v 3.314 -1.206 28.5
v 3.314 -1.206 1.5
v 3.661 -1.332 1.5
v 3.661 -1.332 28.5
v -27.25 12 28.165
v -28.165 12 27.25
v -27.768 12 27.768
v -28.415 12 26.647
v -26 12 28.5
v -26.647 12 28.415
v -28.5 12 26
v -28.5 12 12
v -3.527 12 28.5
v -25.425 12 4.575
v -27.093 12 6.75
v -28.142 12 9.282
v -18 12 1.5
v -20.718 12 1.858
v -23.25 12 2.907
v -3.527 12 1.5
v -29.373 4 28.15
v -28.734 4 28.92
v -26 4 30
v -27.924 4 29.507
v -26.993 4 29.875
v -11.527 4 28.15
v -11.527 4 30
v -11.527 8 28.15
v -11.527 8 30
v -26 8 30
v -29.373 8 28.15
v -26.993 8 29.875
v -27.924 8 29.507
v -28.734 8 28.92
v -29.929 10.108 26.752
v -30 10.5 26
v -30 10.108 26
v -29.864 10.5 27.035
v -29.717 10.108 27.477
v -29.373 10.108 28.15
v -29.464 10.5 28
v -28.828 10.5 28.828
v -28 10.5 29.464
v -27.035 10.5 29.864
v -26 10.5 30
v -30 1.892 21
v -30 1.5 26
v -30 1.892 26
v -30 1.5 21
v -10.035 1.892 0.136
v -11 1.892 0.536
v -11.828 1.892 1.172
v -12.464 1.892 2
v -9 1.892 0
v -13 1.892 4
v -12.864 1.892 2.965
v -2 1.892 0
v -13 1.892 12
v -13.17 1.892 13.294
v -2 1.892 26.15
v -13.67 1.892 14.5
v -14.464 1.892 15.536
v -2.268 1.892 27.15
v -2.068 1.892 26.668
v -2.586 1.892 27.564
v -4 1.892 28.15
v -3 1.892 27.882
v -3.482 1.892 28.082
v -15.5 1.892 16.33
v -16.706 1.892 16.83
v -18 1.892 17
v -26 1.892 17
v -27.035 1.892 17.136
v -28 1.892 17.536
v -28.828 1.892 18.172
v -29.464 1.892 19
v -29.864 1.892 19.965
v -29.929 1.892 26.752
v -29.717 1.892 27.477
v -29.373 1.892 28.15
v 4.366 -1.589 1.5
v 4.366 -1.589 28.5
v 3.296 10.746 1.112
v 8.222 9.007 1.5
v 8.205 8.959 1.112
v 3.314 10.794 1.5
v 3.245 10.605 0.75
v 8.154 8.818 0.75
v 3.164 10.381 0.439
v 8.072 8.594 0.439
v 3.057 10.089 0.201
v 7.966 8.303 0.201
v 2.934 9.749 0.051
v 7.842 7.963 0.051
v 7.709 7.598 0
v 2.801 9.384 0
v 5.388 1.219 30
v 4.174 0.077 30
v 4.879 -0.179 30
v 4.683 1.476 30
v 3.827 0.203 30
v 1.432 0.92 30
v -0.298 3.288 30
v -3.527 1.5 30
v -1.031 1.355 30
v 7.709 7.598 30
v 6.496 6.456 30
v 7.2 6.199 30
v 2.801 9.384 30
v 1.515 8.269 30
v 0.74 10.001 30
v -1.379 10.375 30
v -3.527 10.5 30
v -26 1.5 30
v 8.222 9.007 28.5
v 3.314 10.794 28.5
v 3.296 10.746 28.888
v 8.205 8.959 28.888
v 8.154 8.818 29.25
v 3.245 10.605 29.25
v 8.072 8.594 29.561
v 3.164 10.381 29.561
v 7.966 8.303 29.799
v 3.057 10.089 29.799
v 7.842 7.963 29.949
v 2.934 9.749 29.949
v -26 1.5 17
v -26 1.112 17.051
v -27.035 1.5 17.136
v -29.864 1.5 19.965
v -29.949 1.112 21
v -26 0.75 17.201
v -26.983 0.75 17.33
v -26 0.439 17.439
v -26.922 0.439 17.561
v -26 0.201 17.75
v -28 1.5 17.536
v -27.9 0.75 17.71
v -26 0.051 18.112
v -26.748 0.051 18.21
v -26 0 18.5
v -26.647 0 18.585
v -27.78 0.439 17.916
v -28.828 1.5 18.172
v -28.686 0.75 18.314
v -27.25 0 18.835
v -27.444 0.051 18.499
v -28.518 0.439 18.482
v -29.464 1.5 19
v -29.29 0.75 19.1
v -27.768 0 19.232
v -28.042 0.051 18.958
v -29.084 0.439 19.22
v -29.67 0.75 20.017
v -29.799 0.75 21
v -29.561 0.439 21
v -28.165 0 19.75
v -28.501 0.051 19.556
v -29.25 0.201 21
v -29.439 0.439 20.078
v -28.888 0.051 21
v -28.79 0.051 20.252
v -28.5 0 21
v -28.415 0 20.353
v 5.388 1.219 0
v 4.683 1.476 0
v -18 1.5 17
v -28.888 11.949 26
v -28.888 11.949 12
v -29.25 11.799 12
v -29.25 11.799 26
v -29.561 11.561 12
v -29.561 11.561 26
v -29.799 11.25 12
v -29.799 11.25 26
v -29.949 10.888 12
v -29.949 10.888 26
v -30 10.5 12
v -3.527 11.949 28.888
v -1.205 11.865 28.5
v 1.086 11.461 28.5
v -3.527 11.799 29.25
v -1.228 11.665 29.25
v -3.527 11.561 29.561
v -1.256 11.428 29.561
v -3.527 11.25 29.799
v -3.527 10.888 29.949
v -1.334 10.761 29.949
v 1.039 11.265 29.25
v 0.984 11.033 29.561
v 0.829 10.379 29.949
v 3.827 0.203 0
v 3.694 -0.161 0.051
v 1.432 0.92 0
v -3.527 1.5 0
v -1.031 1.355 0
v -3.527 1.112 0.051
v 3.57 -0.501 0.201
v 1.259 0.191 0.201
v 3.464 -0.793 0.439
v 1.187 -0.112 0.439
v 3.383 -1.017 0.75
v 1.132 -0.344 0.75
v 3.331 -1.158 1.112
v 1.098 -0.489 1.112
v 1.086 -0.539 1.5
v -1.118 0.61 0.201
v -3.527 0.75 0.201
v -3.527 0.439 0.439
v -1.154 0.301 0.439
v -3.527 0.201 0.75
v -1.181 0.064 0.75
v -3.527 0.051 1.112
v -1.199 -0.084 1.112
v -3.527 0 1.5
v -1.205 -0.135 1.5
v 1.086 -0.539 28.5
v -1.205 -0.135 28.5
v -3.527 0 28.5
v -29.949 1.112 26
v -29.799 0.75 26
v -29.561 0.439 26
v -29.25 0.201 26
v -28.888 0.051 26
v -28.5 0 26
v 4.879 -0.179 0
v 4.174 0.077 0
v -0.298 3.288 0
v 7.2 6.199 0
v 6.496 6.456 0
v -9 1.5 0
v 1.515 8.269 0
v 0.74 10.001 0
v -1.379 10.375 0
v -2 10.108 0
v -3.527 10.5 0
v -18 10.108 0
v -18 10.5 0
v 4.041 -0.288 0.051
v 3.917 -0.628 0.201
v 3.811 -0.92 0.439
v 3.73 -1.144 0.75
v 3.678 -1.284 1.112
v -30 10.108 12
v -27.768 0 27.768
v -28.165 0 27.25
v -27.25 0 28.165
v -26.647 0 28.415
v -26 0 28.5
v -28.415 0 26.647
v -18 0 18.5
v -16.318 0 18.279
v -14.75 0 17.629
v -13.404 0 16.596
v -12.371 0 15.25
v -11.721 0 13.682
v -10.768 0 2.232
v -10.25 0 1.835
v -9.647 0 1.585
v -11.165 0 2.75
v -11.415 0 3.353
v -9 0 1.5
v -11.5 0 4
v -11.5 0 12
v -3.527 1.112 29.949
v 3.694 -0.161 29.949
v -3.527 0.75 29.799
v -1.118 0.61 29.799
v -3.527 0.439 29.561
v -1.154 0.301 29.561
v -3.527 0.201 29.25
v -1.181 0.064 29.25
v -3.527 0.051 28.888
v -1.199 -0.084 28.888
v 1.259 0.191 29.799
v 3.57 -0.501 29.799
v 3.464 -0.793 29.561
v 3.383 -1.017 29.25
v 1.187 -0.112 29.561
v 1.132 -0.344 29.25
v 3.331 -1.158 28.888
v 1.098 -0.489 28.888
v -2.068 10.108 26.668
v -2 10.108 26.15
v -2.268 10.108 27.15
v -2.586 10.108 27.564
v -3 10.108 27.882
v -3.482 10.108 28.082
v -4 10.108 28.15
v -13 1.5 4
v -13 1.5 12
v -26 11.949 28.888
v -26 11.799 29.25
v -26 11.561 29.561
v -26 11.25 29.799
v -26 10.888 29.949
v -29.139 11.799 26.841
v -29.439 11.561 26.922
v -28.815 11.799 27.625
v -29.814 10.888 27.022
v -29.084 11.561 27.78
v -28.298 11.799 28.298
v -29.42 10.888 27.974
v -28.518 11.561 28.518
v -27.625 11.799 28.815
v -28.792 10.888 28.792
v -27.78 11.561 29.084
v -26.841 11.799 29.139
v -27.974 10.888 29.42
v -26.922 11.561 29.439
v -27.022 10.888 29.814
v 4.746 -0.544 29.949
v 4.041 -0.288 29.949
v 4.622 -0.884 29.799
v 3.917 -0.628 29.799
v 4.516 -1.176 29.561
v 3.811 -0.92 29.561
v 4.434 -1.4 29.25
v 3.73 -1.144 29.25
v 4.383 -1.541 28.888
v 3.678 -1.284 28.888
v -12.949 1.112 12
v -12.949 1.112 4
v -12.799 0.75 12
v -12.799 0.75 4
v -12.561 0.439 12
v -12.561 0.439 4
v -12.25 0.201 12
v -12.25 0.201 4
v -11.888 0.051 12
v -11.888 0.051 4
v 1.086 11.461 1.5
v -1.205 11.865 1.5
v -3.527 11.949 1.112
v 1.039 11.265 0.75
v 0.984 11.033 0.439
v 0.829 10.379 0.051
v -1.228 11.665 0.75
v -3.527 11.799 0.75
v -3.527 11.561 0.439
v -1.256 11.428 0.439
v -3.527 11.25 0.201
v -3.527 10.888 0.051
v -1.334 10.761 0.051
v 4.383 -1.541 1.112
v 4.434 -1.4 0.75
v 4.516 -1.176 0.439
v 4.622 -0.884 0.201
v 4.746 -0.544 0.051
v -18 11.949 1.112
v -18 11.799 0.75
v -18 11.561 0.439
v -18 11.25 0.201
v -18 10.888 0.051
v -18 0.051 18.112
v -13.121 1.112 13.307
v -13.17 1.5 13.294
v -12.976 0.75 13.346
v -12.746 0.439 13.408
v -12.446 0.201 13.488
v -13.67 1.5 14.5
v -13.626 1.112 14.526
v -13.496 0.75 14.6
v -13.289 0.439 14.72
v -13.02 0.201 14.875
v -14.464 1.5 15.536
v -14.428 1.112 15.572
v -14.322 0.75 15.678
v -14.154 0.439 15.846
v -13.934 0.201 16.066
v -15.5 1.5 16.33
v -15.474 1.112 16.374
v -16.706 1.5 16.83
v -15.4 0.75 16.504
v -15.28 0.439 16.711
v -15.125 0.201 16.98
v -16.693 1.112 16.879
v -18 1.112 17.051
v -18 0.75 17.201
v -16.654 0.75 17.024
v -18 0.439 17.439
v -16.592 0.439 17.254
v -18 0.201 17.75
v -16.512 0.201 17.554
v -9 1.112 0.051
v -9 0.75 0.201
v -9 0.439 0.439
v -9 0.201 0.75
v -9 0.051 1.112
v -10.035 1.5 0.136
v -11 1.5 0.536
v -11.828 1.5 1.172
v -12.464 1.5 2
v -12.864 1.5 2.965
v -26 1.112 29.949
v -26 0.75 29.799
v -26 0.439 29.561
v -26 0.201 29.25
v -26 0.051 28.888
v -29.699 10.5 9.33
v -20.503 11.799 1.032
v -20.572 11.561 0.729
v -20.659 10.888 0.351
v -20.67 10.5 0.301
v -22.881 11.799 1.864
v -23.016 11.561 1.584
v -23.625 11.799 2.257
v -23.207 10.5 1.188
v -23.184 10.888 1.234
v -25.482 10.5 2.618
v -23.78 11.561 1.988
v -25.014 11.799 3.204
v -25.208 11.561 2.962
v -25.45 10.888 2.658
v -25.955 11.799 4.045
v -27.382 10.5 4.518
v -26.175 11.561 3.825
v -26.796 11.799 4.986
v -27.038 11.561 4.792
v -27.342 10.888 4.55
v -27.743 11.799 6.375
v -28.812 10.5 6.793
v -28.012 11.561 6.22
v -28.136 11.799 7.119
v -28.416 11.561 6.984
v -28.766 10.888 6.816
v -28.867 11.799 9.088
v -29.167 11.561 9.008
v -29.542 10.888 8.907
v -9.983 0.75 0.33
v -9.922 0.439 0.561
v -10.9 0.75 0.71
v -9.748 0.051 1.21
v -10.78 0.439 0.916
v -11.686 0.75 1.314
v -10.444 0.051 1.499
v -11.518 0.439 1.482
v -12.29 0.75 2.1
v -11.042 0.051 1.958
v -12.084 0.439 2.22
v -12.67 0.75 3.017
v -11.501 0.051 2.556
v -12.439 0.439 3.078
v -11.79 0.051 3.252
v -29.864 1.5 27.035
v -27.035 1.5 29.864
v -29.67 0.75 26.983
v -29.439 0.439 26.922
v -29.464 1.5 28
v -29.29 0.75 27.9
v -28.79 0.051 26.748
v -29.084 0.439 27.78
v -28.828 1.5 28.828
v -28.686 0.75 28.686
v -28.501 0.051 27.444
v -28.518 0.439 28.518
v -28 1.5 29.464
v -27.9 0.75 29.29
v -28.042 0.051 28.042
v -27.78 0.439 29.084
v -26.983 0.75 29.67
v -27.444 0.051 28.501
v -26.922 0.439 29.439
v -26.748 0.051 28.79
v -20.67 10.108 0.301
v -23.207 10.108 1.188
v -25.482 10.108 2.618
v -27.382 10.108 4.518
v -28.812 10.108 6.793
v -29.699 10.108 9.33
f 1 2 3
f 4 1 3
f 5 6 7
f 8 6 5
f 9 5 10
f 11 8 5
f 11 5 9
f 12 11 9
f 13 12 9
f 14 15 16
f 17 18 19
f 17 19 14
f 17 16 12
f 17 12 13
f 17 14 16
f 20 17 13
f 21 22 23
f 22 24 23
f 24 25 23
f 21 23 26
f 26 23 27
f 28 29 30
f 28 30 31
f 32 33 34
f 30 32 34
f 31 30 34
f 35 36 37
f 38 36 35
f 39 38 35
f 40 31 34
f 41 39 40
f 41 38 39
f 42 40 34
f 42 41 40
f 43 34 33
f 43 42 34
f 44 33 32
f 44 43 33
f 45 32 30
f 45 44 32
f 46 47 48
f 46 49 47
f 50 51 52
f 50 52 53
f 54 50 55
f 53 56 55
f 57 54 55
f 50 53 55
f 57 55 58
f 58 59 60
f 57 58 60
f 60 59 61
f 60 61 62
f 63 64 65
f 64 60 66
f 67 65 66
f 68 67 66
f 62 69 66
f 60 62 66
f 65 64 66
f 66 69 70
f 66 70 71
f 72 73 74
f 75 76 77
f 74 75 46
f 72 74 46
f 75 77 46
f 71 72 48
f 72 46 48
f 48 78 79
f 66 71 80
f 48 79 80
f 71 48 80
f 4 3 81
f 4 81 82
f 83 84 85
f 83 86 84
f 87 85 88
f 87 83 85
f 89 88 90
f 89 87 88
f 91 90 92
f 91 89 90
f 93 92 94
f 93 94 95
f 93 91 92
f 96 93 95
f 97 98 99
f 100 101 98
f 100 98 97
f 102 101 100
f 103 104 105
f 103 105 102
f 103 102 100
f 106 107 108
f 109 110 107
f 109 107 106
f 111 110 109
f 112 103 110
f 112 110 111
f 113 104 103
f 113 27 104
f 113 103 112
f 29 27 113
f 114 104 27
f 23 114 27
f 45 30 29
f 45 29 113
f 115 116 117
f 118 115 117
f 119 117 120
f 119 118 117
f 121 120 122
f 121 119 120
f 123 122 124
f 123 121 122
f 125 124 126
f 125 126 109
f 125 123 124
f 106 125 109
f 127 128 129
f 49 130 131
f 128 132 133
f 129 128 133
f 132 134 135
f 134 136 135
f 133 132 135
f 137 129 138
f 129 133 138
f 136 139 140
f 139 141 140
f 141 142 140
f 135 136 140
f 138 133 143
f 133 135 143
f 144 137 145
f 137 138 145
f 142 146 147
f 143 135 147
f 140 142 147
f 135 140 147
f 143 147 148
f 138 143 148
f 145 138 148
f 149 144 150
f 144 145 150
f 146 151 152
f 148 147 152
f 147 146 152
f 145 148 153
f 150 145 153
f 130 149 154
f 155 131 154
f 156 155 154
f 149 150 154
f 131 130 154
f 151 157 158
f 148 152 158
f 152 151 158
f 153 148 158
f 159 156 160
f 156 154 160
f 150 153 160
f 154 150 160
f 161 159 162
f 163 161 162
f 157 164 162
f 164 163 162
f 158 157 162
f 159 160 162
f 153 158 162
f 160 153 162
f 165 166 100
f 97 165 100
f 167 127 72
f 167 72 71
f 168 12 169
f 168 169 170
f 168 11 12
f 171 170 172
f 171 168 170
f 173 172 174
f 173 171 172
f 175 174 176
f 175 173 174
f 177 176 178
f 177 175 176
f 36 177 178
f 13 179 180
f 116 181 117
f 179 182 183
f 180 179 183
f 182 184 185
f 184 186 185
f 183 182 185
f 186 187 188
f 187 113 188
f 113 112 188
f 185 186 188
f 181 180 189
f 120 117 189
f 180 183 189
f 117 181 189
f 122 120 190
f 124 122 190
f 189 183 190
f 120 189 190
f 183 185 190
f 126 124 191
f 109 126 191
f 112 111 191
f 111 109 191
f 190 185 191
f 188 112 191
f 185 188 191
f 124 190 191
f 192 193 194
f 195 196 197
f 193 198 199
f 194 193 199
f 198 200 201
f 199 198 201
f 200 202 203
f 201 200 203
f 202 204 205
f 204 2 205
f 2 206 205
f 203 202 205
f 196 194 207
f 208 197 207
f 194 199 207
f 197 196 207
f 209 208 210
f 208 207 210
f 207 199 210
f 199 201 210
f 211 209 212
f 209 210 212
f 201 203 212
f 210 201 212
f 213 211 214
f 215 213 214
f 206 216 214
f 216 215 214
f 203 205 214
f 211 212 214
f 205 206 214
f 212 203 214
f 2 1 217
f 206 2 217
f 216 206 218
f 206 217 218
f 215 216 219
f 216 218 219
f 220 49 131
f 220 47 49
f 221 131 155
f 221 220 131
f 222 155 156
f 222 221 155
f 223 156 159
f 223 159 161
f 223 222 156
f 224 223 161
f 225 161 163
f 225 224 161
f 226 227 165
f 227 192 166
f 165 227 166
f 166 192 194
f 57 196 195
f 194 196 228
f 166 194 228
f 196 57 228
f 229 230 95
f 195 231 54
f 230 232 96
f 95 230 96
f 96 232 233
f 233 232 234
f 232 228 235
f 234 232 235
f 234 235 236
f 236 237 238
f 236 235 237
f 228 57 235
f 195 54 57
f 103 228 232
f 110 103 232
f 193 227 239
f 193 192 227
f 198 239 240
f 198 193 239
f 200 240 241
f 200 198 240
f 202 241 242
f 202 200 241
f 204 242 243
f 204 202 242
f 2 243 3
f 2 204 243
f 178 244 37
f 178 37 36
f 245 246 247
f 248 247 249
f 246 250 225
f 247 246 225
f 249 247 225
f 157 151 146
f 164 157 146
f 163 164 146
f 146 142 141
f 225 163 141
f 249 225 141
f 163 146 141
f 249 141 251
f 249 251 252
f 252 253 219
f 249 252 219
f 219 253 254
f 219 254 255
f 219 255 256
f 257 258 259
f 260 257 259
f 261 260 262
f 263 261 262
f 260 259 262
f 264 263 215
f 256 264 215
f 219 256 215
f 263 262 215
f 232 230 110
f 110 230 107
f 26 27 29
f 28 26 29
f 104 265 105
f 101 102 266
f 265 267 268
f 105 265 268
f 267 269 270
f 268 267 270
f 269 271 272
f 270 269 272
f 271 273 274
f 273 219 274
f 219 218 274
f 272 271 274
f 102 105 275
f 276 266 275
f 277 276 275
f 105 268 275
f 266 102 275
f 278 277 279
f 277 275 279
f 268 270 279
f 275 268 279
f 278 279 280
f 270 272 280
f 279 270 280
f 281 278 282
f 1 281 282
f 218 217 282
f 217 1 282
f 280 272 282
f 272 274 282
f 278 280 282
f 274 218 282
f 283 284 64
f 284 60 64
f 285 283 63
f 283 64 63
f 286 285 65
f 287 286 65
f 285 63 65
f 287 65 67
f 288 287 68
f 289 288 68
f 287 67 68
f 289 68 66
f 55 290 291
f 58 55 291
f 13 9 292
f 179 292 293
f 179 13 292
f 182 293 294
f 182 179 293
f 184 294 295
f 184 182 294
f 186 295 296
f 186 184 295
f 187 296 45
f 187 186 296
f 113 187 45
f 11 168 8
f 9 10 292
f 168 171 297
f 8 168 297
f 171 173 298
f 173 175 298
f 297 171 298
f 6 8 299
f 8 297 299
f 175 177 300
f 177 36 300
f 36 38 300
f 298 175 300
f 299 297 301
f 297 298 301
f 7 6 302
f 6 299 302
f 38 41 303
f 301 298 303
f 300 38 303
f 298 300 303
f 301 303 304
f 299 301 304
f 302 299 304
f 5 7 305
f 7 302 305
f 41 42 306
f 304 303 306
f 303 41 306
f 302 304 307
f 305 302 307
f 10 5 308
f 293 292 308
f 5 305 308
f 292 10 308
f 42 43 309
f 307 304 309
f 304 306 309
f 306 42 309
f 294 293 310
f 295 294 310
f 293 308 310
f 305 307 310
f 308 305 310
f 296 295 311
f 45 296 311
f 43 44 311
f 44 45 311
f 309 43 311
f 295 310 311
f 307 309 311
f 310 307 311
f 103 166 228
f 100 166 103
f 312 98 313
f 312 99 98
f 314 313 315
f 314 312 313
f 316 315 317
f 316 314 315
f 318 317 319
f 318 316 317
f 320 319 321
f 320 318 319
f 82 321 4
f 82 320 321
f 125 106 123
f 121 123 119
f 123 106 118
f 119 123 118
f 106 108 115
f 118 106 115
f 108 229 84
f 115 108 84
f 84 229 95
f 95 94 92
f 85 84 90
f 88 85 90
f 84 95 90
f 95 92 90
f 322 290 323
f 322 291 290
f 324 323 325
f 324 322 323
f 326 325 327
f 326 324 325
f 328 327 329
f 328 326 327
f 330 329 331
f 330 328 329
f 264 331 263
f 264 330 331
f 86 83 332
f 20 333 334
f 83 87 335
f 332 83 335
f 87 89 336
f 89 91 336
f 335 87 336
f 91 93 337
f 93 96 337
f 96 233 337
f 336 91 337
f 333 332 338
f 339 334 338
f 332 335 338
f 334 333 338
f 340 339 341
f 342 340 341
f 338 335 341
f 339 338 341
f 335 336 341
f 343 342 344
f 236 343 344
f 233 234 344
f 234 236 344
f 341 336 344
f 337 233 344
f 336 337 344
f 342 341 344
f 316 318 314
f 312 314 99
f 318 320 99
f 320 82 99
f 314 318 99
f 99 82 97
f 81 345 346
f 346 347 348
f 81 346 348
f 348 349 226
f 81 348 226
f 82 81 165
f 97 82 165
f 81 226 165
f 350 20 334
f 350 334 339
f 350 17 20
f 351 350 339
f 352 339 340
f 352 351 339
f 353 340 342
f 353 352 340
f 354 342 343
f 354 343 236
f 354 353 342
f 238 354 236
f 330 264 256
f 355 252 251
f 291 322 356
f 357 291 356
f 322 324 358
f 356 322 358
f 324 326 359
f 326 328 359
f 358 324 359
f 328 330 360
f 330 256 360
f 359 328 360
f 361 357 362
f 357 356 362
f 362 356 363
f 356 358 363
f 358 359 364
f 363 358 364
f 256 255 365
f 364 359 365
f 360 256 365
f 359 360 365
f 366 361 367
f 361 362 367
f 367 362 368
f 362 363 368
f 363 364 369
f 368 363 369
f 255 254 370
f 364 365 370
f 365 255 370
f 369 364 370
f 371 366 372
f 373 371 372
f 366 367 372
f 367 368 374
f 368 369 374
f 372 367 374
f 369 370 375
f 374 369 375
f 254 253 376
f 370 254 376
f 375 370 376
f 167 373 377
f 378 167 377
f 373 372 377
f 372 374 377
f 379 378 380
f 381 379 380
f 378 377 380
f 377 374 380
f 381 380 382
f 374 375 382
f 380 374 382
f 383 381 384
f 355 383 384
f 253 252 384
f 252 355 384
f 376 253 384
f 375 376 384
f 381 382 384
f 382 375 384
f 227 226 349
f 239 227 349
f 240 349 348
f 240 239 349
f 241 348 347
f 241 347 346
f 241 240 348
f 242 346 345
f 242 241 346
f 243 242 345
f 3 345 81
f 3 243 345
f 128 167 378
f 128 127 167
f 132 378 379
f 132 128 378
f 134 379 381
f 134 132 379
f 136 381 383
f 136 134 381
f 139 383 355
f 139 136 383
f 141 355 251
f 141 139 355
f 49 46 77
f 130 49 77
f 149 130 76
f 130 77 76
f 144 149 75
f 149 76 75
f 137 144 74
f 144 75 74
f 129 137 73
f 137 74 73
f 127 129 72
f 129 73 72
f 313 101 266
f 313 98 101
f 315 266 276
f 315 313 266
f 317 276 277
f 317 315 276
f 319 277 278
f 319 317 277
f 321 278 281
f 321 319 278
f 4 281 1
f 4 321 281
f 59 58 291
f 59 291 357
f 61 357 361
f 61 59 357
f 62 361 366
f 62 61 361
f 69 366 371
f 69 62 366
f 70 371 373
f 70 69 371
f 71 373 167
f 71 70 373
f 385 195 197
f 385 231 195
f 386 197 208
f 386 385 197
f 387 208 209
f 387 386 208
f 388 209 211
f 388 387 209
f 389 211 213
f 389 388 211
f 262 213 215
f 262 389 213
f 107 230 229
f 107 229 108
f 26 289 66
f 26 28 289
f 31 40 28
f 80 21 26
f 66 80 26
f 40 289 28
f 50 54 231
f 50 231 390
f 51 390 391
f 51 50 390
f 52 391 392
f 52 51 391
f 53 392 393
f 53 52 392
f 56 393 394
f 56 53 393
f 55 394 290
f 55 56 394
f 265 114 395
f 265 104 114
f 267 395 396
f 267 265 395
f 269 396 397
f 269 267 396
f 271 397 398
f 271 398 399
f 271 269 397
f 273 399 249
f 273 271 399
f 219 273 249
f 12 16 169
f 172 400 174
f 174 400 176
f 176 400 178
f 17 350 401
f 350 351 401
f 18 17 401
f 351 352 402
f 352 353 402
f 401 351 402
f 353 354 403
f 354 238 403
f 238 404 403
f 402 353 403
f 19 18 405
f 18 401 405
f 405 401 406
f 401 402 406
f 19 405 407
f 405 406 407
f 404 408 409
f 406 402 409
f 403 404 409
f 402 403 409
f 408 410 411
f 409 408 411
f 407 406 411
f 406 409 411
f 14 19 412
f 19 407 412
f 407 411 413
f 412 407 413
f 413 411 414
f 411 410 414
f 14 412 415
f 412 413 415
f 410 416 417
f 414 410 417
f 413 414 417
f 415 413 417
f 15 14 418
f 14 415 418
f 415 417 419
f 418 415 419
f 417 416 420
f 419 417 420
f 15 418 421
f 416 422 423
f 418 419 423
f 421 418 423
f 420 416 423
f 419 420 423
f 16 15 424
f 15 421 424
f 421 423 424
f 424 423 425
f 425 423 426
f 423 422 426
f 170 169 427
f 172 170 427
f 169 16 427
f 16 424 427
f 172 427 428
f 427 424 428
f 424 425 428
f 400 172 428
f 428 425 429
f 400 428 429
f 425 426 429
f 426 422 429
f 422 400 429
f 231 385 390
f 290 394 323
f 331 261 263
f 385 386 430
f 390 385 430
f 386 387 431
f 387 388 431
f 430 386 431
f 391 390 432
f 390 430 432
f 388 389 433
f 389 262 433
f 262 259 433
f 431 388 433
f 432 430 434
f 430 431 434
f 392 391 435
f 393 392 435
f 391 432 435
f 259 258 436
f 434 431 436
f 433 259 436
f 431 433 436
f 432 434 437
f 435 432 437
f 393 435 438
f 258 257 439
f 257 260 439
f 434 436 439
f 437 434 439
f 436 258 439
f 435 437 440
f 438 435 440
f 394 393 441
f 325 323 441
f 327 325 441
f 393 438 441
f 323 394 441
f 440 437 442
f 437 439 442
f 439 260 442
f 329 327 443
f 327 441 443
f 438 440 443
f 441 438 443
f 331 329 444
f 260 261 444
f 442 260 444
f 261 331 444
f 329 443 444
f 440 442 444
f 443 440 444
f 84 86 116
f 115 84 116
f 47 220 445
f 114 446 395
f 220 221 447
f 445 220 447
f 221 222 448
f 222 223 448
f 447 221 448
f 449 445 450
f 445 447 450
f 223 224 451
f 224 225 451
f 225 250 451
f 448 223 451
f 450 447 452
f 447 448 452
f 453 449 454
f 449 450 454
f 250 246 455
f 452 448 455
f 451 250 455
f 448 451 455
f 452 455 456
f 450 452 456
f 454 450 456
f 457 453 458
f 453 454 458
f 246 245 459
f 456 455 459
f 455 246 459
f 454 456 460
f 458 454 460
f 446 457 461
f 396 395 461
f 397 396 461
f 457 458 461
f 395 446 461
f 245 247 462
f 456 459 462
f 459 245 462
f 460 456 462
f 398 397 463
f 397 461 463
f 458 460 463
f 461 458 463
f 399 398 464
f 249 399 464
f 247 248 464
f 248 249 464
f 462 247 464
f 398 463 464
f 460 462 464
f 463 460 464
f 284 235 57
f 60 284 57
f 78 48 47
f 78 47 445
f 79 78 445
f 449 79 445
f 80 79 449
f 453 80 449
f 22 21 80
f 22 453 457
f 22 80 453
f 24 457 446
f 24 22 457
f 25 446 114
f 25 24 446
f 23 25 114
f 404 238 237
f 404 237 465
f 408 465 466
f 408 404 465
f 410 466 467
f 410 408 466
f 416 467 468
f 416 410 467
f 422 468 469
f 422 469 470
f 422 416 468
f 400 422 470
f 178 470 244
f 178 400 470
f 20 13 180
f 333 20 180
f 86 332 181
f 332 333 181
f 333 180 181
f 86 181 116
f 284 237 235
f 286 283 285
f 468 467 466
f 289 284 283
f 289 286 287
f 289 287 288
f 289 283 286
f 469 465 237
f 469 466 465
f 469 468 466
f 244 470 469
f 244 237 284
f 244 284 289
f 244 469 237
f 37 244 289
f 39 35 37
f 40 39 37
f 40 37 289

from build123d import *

# Parameters (mm, degrees)
F0_W         = 30
F0_H         = 12
F1_DEPTH     = 30
F2_W         = 8.215
F2_H         = 28.15
F3_DEPTH     = 28
F4_W         = 5.3
F4_H         = 30
F5_DEPTH     = 5.3
F6_W         = 17
F6_H         = 17
F7_DEPTH     = 2.8
F8_DEPTH     = 0.75
F9_R         = 12
F10_T1_DEPTH = 32
F10_T3_DEPTH = 11.8925
F11_R        = 20
F12_R        = 5
F13_R        = 1.5
F14_R        = 2
F15_W        = 5.0863461345
F15_H        = 4
F15_W_2      = 14.4734603858
F16_DEPTH    = 30.0010001


# Not quite as in the source:
# - a fillet or chamfer that OpenCascade refuses, or shapes differently, is made with other operations: its cross-section is extruded or revolved along the edge and cut away or added


with BuildPart() as f1:
    # F0 (on Top) → F1 (new body)
    with BuildSketch(Plane.XY):
        with Locations((-15, 6)):
            Rectangle(F0_W, F0_H)
        Polygon((0, 12), (0, 0), (3.6608153082, -1.3324278053), (7.5175409663, 9.2638388534), align=None)
    extrude(amount=F1_DEPTH)

    # F2 (on face) → F3 (cut)
    with BuildSketch(Plane(origin=(-30, 0, 0), x_dir=(0, -1, 0), z_dir=(-1, 0, 0))):
        with Locations((-6, 14.075)):
            Rectangle(F2_W, F2_H)
    extrude(amount=-F3_DEPTH, mode=Mode.SUBTRACT)

    # F4 (on face) → F5 (cut)
    with BuildSketch(Plane(origin=(3.6608153082, -1.3324278053, 0), x_dir=(0.3420201433, 0.9396926208, 0), z_dir=(0.9396926208, -0.3420201433, 0))):
        with Locations((5.6381557247, 15)):
            Rectangle(F4_W, F4_H)
    extrude(amount=-F5_DEPTH, mode=Mode.SUBTRACT)

    # F6 (on face) → F7 (cut)
    with BuildSketch(Plane.XZ):
        with Locations((-21.5, 8.5)):
            Rectangle(F6_W, F6_H)
    extrude(amount=-F7_DEPTH, mode=Mode.SUBTRACT)

    # F8 (add): faces of the model
    f8_faces = [f1.faces().sort_by_distance(p)[0] for p in [
        (7.0065362417, 7.8598649113, 15),
        (4.1718200328, 0.0715461368, 15),
    ]]
    extrude(f8_faces, amount=F8_DEPTH)

    # F9
    f9_edges = [f1.edges().sort_by_distance(p)[0] for p in [
        (-30, 11.05375, 0),
    ]]
    fillet(f9_edges, radius=F9_R)

    # F10: fillet of radius 4 on 3 edges, made by hand

    # F10_s2 → F10_t1 (cut)
    with BuildSketch(Plane.XZ.offset(-22)):
        with BuildLine():
            ThreePointArc((-30, 26), (-28.8284271247, 28.8284271247), (-26, 30))
            Line((-26, 30), (-30, 30))
            Line((-30, 30), (-30, 26))
        make_face()
    extrude(amount=F10_T1_DEPTH, mode=Mode.SUBTRACT)

    # F10_s4 → F10_t3 (cut)
    with BuildSketch(Plane.XZ.offset(-1.8925)):
        with BuildLine():
            ThreePointArc((-30, 21), (-28.8284271247, 18.1715728753), (-26, 17))
            Line((-26, 17), (-30, 17))
            Line((-30, 17), (-30, 21))
        make_face()
        with BuildLine():
            ThreePointArc((-9, 0), (-11.8284271247, 1.1715728753), (-13, 4))
            Line((-13, 4), (-13, 0))
            Line((-13, 0), (-9, 0))
        make_face()
    extrude(amount=F10_T3_DEPTH, mode=Mode.SUBTRACT)

    # F11
    f11_edges = [f1.edges().sort_by_distance(p)[0] for p in [
        (0, 12, 15),
        (0, 0, 15),
    ]]
    fillet(f11_edges, radius=F11_R)

    # F12
    f12_edges = [f1.edges().sort_by_distance(p)[0] for p in [
        (-13, 0.94625, 17),
    ]]
    fillet(f12_edges, radius=F12_R)

    # F13
    f13_edges = [f1.edges().sort_by_distance(p)[0] for p in [
        (-14.464466, 0, 15.535534),
        (-22, 0, 17),
        (-28.828427, 0, 28.828427),
        (-14.76327, 0, 30),
        (-0.053576, -0.303845, 30),
        (3.839724, -1.397545, 30),
        (3.839724, -1.397545, 0),
        (-0.053576, -0.303845, 0),
        (-6.26327, 0, 0),
        (-11.828427, 0, 1.171573),
        (-13, 0, 8),
        (-14.76327, 12, 30),
        (-0.053576, 11.696155, 30),
        (-28.828427, 0, 18.171573),
        (-30, 0, 23.5),
        (-10.76327, 12, 0),
        (-0.053576, 11.696155, 0),
        (5.768087, 9.900588, 0),
        (5.768087, 9.900588, 30),
        (-28.828427, 12, 28.828427),
        (-30, 12, 19),
        (-26.485281, 12, 3.514719),
    ]]
    fillet(f13_edges, radius=F13_R)

    # F14
    f14_edges = [f1.edges().sort_by_distance(p)[0] for p in [
        (-2, 6, 28.15),
    ]]
    fillet(f14_edges, radius=F14_R)

    # F15 (on face) → F16 (cut, through all)
    with BuildSketch(Plane.XY.offset(30)):
        with Locations((-28.5431730673, 6)):
            Rectangle(F15_W, F15_H)
        with Locations((-18.7632698071, 6)):
            Rectangle(F15_W_2, F15_H)
    extrude(amount=-F16_DEPTH, mode=Mode.SUBTRACT)


solid = f1.part
